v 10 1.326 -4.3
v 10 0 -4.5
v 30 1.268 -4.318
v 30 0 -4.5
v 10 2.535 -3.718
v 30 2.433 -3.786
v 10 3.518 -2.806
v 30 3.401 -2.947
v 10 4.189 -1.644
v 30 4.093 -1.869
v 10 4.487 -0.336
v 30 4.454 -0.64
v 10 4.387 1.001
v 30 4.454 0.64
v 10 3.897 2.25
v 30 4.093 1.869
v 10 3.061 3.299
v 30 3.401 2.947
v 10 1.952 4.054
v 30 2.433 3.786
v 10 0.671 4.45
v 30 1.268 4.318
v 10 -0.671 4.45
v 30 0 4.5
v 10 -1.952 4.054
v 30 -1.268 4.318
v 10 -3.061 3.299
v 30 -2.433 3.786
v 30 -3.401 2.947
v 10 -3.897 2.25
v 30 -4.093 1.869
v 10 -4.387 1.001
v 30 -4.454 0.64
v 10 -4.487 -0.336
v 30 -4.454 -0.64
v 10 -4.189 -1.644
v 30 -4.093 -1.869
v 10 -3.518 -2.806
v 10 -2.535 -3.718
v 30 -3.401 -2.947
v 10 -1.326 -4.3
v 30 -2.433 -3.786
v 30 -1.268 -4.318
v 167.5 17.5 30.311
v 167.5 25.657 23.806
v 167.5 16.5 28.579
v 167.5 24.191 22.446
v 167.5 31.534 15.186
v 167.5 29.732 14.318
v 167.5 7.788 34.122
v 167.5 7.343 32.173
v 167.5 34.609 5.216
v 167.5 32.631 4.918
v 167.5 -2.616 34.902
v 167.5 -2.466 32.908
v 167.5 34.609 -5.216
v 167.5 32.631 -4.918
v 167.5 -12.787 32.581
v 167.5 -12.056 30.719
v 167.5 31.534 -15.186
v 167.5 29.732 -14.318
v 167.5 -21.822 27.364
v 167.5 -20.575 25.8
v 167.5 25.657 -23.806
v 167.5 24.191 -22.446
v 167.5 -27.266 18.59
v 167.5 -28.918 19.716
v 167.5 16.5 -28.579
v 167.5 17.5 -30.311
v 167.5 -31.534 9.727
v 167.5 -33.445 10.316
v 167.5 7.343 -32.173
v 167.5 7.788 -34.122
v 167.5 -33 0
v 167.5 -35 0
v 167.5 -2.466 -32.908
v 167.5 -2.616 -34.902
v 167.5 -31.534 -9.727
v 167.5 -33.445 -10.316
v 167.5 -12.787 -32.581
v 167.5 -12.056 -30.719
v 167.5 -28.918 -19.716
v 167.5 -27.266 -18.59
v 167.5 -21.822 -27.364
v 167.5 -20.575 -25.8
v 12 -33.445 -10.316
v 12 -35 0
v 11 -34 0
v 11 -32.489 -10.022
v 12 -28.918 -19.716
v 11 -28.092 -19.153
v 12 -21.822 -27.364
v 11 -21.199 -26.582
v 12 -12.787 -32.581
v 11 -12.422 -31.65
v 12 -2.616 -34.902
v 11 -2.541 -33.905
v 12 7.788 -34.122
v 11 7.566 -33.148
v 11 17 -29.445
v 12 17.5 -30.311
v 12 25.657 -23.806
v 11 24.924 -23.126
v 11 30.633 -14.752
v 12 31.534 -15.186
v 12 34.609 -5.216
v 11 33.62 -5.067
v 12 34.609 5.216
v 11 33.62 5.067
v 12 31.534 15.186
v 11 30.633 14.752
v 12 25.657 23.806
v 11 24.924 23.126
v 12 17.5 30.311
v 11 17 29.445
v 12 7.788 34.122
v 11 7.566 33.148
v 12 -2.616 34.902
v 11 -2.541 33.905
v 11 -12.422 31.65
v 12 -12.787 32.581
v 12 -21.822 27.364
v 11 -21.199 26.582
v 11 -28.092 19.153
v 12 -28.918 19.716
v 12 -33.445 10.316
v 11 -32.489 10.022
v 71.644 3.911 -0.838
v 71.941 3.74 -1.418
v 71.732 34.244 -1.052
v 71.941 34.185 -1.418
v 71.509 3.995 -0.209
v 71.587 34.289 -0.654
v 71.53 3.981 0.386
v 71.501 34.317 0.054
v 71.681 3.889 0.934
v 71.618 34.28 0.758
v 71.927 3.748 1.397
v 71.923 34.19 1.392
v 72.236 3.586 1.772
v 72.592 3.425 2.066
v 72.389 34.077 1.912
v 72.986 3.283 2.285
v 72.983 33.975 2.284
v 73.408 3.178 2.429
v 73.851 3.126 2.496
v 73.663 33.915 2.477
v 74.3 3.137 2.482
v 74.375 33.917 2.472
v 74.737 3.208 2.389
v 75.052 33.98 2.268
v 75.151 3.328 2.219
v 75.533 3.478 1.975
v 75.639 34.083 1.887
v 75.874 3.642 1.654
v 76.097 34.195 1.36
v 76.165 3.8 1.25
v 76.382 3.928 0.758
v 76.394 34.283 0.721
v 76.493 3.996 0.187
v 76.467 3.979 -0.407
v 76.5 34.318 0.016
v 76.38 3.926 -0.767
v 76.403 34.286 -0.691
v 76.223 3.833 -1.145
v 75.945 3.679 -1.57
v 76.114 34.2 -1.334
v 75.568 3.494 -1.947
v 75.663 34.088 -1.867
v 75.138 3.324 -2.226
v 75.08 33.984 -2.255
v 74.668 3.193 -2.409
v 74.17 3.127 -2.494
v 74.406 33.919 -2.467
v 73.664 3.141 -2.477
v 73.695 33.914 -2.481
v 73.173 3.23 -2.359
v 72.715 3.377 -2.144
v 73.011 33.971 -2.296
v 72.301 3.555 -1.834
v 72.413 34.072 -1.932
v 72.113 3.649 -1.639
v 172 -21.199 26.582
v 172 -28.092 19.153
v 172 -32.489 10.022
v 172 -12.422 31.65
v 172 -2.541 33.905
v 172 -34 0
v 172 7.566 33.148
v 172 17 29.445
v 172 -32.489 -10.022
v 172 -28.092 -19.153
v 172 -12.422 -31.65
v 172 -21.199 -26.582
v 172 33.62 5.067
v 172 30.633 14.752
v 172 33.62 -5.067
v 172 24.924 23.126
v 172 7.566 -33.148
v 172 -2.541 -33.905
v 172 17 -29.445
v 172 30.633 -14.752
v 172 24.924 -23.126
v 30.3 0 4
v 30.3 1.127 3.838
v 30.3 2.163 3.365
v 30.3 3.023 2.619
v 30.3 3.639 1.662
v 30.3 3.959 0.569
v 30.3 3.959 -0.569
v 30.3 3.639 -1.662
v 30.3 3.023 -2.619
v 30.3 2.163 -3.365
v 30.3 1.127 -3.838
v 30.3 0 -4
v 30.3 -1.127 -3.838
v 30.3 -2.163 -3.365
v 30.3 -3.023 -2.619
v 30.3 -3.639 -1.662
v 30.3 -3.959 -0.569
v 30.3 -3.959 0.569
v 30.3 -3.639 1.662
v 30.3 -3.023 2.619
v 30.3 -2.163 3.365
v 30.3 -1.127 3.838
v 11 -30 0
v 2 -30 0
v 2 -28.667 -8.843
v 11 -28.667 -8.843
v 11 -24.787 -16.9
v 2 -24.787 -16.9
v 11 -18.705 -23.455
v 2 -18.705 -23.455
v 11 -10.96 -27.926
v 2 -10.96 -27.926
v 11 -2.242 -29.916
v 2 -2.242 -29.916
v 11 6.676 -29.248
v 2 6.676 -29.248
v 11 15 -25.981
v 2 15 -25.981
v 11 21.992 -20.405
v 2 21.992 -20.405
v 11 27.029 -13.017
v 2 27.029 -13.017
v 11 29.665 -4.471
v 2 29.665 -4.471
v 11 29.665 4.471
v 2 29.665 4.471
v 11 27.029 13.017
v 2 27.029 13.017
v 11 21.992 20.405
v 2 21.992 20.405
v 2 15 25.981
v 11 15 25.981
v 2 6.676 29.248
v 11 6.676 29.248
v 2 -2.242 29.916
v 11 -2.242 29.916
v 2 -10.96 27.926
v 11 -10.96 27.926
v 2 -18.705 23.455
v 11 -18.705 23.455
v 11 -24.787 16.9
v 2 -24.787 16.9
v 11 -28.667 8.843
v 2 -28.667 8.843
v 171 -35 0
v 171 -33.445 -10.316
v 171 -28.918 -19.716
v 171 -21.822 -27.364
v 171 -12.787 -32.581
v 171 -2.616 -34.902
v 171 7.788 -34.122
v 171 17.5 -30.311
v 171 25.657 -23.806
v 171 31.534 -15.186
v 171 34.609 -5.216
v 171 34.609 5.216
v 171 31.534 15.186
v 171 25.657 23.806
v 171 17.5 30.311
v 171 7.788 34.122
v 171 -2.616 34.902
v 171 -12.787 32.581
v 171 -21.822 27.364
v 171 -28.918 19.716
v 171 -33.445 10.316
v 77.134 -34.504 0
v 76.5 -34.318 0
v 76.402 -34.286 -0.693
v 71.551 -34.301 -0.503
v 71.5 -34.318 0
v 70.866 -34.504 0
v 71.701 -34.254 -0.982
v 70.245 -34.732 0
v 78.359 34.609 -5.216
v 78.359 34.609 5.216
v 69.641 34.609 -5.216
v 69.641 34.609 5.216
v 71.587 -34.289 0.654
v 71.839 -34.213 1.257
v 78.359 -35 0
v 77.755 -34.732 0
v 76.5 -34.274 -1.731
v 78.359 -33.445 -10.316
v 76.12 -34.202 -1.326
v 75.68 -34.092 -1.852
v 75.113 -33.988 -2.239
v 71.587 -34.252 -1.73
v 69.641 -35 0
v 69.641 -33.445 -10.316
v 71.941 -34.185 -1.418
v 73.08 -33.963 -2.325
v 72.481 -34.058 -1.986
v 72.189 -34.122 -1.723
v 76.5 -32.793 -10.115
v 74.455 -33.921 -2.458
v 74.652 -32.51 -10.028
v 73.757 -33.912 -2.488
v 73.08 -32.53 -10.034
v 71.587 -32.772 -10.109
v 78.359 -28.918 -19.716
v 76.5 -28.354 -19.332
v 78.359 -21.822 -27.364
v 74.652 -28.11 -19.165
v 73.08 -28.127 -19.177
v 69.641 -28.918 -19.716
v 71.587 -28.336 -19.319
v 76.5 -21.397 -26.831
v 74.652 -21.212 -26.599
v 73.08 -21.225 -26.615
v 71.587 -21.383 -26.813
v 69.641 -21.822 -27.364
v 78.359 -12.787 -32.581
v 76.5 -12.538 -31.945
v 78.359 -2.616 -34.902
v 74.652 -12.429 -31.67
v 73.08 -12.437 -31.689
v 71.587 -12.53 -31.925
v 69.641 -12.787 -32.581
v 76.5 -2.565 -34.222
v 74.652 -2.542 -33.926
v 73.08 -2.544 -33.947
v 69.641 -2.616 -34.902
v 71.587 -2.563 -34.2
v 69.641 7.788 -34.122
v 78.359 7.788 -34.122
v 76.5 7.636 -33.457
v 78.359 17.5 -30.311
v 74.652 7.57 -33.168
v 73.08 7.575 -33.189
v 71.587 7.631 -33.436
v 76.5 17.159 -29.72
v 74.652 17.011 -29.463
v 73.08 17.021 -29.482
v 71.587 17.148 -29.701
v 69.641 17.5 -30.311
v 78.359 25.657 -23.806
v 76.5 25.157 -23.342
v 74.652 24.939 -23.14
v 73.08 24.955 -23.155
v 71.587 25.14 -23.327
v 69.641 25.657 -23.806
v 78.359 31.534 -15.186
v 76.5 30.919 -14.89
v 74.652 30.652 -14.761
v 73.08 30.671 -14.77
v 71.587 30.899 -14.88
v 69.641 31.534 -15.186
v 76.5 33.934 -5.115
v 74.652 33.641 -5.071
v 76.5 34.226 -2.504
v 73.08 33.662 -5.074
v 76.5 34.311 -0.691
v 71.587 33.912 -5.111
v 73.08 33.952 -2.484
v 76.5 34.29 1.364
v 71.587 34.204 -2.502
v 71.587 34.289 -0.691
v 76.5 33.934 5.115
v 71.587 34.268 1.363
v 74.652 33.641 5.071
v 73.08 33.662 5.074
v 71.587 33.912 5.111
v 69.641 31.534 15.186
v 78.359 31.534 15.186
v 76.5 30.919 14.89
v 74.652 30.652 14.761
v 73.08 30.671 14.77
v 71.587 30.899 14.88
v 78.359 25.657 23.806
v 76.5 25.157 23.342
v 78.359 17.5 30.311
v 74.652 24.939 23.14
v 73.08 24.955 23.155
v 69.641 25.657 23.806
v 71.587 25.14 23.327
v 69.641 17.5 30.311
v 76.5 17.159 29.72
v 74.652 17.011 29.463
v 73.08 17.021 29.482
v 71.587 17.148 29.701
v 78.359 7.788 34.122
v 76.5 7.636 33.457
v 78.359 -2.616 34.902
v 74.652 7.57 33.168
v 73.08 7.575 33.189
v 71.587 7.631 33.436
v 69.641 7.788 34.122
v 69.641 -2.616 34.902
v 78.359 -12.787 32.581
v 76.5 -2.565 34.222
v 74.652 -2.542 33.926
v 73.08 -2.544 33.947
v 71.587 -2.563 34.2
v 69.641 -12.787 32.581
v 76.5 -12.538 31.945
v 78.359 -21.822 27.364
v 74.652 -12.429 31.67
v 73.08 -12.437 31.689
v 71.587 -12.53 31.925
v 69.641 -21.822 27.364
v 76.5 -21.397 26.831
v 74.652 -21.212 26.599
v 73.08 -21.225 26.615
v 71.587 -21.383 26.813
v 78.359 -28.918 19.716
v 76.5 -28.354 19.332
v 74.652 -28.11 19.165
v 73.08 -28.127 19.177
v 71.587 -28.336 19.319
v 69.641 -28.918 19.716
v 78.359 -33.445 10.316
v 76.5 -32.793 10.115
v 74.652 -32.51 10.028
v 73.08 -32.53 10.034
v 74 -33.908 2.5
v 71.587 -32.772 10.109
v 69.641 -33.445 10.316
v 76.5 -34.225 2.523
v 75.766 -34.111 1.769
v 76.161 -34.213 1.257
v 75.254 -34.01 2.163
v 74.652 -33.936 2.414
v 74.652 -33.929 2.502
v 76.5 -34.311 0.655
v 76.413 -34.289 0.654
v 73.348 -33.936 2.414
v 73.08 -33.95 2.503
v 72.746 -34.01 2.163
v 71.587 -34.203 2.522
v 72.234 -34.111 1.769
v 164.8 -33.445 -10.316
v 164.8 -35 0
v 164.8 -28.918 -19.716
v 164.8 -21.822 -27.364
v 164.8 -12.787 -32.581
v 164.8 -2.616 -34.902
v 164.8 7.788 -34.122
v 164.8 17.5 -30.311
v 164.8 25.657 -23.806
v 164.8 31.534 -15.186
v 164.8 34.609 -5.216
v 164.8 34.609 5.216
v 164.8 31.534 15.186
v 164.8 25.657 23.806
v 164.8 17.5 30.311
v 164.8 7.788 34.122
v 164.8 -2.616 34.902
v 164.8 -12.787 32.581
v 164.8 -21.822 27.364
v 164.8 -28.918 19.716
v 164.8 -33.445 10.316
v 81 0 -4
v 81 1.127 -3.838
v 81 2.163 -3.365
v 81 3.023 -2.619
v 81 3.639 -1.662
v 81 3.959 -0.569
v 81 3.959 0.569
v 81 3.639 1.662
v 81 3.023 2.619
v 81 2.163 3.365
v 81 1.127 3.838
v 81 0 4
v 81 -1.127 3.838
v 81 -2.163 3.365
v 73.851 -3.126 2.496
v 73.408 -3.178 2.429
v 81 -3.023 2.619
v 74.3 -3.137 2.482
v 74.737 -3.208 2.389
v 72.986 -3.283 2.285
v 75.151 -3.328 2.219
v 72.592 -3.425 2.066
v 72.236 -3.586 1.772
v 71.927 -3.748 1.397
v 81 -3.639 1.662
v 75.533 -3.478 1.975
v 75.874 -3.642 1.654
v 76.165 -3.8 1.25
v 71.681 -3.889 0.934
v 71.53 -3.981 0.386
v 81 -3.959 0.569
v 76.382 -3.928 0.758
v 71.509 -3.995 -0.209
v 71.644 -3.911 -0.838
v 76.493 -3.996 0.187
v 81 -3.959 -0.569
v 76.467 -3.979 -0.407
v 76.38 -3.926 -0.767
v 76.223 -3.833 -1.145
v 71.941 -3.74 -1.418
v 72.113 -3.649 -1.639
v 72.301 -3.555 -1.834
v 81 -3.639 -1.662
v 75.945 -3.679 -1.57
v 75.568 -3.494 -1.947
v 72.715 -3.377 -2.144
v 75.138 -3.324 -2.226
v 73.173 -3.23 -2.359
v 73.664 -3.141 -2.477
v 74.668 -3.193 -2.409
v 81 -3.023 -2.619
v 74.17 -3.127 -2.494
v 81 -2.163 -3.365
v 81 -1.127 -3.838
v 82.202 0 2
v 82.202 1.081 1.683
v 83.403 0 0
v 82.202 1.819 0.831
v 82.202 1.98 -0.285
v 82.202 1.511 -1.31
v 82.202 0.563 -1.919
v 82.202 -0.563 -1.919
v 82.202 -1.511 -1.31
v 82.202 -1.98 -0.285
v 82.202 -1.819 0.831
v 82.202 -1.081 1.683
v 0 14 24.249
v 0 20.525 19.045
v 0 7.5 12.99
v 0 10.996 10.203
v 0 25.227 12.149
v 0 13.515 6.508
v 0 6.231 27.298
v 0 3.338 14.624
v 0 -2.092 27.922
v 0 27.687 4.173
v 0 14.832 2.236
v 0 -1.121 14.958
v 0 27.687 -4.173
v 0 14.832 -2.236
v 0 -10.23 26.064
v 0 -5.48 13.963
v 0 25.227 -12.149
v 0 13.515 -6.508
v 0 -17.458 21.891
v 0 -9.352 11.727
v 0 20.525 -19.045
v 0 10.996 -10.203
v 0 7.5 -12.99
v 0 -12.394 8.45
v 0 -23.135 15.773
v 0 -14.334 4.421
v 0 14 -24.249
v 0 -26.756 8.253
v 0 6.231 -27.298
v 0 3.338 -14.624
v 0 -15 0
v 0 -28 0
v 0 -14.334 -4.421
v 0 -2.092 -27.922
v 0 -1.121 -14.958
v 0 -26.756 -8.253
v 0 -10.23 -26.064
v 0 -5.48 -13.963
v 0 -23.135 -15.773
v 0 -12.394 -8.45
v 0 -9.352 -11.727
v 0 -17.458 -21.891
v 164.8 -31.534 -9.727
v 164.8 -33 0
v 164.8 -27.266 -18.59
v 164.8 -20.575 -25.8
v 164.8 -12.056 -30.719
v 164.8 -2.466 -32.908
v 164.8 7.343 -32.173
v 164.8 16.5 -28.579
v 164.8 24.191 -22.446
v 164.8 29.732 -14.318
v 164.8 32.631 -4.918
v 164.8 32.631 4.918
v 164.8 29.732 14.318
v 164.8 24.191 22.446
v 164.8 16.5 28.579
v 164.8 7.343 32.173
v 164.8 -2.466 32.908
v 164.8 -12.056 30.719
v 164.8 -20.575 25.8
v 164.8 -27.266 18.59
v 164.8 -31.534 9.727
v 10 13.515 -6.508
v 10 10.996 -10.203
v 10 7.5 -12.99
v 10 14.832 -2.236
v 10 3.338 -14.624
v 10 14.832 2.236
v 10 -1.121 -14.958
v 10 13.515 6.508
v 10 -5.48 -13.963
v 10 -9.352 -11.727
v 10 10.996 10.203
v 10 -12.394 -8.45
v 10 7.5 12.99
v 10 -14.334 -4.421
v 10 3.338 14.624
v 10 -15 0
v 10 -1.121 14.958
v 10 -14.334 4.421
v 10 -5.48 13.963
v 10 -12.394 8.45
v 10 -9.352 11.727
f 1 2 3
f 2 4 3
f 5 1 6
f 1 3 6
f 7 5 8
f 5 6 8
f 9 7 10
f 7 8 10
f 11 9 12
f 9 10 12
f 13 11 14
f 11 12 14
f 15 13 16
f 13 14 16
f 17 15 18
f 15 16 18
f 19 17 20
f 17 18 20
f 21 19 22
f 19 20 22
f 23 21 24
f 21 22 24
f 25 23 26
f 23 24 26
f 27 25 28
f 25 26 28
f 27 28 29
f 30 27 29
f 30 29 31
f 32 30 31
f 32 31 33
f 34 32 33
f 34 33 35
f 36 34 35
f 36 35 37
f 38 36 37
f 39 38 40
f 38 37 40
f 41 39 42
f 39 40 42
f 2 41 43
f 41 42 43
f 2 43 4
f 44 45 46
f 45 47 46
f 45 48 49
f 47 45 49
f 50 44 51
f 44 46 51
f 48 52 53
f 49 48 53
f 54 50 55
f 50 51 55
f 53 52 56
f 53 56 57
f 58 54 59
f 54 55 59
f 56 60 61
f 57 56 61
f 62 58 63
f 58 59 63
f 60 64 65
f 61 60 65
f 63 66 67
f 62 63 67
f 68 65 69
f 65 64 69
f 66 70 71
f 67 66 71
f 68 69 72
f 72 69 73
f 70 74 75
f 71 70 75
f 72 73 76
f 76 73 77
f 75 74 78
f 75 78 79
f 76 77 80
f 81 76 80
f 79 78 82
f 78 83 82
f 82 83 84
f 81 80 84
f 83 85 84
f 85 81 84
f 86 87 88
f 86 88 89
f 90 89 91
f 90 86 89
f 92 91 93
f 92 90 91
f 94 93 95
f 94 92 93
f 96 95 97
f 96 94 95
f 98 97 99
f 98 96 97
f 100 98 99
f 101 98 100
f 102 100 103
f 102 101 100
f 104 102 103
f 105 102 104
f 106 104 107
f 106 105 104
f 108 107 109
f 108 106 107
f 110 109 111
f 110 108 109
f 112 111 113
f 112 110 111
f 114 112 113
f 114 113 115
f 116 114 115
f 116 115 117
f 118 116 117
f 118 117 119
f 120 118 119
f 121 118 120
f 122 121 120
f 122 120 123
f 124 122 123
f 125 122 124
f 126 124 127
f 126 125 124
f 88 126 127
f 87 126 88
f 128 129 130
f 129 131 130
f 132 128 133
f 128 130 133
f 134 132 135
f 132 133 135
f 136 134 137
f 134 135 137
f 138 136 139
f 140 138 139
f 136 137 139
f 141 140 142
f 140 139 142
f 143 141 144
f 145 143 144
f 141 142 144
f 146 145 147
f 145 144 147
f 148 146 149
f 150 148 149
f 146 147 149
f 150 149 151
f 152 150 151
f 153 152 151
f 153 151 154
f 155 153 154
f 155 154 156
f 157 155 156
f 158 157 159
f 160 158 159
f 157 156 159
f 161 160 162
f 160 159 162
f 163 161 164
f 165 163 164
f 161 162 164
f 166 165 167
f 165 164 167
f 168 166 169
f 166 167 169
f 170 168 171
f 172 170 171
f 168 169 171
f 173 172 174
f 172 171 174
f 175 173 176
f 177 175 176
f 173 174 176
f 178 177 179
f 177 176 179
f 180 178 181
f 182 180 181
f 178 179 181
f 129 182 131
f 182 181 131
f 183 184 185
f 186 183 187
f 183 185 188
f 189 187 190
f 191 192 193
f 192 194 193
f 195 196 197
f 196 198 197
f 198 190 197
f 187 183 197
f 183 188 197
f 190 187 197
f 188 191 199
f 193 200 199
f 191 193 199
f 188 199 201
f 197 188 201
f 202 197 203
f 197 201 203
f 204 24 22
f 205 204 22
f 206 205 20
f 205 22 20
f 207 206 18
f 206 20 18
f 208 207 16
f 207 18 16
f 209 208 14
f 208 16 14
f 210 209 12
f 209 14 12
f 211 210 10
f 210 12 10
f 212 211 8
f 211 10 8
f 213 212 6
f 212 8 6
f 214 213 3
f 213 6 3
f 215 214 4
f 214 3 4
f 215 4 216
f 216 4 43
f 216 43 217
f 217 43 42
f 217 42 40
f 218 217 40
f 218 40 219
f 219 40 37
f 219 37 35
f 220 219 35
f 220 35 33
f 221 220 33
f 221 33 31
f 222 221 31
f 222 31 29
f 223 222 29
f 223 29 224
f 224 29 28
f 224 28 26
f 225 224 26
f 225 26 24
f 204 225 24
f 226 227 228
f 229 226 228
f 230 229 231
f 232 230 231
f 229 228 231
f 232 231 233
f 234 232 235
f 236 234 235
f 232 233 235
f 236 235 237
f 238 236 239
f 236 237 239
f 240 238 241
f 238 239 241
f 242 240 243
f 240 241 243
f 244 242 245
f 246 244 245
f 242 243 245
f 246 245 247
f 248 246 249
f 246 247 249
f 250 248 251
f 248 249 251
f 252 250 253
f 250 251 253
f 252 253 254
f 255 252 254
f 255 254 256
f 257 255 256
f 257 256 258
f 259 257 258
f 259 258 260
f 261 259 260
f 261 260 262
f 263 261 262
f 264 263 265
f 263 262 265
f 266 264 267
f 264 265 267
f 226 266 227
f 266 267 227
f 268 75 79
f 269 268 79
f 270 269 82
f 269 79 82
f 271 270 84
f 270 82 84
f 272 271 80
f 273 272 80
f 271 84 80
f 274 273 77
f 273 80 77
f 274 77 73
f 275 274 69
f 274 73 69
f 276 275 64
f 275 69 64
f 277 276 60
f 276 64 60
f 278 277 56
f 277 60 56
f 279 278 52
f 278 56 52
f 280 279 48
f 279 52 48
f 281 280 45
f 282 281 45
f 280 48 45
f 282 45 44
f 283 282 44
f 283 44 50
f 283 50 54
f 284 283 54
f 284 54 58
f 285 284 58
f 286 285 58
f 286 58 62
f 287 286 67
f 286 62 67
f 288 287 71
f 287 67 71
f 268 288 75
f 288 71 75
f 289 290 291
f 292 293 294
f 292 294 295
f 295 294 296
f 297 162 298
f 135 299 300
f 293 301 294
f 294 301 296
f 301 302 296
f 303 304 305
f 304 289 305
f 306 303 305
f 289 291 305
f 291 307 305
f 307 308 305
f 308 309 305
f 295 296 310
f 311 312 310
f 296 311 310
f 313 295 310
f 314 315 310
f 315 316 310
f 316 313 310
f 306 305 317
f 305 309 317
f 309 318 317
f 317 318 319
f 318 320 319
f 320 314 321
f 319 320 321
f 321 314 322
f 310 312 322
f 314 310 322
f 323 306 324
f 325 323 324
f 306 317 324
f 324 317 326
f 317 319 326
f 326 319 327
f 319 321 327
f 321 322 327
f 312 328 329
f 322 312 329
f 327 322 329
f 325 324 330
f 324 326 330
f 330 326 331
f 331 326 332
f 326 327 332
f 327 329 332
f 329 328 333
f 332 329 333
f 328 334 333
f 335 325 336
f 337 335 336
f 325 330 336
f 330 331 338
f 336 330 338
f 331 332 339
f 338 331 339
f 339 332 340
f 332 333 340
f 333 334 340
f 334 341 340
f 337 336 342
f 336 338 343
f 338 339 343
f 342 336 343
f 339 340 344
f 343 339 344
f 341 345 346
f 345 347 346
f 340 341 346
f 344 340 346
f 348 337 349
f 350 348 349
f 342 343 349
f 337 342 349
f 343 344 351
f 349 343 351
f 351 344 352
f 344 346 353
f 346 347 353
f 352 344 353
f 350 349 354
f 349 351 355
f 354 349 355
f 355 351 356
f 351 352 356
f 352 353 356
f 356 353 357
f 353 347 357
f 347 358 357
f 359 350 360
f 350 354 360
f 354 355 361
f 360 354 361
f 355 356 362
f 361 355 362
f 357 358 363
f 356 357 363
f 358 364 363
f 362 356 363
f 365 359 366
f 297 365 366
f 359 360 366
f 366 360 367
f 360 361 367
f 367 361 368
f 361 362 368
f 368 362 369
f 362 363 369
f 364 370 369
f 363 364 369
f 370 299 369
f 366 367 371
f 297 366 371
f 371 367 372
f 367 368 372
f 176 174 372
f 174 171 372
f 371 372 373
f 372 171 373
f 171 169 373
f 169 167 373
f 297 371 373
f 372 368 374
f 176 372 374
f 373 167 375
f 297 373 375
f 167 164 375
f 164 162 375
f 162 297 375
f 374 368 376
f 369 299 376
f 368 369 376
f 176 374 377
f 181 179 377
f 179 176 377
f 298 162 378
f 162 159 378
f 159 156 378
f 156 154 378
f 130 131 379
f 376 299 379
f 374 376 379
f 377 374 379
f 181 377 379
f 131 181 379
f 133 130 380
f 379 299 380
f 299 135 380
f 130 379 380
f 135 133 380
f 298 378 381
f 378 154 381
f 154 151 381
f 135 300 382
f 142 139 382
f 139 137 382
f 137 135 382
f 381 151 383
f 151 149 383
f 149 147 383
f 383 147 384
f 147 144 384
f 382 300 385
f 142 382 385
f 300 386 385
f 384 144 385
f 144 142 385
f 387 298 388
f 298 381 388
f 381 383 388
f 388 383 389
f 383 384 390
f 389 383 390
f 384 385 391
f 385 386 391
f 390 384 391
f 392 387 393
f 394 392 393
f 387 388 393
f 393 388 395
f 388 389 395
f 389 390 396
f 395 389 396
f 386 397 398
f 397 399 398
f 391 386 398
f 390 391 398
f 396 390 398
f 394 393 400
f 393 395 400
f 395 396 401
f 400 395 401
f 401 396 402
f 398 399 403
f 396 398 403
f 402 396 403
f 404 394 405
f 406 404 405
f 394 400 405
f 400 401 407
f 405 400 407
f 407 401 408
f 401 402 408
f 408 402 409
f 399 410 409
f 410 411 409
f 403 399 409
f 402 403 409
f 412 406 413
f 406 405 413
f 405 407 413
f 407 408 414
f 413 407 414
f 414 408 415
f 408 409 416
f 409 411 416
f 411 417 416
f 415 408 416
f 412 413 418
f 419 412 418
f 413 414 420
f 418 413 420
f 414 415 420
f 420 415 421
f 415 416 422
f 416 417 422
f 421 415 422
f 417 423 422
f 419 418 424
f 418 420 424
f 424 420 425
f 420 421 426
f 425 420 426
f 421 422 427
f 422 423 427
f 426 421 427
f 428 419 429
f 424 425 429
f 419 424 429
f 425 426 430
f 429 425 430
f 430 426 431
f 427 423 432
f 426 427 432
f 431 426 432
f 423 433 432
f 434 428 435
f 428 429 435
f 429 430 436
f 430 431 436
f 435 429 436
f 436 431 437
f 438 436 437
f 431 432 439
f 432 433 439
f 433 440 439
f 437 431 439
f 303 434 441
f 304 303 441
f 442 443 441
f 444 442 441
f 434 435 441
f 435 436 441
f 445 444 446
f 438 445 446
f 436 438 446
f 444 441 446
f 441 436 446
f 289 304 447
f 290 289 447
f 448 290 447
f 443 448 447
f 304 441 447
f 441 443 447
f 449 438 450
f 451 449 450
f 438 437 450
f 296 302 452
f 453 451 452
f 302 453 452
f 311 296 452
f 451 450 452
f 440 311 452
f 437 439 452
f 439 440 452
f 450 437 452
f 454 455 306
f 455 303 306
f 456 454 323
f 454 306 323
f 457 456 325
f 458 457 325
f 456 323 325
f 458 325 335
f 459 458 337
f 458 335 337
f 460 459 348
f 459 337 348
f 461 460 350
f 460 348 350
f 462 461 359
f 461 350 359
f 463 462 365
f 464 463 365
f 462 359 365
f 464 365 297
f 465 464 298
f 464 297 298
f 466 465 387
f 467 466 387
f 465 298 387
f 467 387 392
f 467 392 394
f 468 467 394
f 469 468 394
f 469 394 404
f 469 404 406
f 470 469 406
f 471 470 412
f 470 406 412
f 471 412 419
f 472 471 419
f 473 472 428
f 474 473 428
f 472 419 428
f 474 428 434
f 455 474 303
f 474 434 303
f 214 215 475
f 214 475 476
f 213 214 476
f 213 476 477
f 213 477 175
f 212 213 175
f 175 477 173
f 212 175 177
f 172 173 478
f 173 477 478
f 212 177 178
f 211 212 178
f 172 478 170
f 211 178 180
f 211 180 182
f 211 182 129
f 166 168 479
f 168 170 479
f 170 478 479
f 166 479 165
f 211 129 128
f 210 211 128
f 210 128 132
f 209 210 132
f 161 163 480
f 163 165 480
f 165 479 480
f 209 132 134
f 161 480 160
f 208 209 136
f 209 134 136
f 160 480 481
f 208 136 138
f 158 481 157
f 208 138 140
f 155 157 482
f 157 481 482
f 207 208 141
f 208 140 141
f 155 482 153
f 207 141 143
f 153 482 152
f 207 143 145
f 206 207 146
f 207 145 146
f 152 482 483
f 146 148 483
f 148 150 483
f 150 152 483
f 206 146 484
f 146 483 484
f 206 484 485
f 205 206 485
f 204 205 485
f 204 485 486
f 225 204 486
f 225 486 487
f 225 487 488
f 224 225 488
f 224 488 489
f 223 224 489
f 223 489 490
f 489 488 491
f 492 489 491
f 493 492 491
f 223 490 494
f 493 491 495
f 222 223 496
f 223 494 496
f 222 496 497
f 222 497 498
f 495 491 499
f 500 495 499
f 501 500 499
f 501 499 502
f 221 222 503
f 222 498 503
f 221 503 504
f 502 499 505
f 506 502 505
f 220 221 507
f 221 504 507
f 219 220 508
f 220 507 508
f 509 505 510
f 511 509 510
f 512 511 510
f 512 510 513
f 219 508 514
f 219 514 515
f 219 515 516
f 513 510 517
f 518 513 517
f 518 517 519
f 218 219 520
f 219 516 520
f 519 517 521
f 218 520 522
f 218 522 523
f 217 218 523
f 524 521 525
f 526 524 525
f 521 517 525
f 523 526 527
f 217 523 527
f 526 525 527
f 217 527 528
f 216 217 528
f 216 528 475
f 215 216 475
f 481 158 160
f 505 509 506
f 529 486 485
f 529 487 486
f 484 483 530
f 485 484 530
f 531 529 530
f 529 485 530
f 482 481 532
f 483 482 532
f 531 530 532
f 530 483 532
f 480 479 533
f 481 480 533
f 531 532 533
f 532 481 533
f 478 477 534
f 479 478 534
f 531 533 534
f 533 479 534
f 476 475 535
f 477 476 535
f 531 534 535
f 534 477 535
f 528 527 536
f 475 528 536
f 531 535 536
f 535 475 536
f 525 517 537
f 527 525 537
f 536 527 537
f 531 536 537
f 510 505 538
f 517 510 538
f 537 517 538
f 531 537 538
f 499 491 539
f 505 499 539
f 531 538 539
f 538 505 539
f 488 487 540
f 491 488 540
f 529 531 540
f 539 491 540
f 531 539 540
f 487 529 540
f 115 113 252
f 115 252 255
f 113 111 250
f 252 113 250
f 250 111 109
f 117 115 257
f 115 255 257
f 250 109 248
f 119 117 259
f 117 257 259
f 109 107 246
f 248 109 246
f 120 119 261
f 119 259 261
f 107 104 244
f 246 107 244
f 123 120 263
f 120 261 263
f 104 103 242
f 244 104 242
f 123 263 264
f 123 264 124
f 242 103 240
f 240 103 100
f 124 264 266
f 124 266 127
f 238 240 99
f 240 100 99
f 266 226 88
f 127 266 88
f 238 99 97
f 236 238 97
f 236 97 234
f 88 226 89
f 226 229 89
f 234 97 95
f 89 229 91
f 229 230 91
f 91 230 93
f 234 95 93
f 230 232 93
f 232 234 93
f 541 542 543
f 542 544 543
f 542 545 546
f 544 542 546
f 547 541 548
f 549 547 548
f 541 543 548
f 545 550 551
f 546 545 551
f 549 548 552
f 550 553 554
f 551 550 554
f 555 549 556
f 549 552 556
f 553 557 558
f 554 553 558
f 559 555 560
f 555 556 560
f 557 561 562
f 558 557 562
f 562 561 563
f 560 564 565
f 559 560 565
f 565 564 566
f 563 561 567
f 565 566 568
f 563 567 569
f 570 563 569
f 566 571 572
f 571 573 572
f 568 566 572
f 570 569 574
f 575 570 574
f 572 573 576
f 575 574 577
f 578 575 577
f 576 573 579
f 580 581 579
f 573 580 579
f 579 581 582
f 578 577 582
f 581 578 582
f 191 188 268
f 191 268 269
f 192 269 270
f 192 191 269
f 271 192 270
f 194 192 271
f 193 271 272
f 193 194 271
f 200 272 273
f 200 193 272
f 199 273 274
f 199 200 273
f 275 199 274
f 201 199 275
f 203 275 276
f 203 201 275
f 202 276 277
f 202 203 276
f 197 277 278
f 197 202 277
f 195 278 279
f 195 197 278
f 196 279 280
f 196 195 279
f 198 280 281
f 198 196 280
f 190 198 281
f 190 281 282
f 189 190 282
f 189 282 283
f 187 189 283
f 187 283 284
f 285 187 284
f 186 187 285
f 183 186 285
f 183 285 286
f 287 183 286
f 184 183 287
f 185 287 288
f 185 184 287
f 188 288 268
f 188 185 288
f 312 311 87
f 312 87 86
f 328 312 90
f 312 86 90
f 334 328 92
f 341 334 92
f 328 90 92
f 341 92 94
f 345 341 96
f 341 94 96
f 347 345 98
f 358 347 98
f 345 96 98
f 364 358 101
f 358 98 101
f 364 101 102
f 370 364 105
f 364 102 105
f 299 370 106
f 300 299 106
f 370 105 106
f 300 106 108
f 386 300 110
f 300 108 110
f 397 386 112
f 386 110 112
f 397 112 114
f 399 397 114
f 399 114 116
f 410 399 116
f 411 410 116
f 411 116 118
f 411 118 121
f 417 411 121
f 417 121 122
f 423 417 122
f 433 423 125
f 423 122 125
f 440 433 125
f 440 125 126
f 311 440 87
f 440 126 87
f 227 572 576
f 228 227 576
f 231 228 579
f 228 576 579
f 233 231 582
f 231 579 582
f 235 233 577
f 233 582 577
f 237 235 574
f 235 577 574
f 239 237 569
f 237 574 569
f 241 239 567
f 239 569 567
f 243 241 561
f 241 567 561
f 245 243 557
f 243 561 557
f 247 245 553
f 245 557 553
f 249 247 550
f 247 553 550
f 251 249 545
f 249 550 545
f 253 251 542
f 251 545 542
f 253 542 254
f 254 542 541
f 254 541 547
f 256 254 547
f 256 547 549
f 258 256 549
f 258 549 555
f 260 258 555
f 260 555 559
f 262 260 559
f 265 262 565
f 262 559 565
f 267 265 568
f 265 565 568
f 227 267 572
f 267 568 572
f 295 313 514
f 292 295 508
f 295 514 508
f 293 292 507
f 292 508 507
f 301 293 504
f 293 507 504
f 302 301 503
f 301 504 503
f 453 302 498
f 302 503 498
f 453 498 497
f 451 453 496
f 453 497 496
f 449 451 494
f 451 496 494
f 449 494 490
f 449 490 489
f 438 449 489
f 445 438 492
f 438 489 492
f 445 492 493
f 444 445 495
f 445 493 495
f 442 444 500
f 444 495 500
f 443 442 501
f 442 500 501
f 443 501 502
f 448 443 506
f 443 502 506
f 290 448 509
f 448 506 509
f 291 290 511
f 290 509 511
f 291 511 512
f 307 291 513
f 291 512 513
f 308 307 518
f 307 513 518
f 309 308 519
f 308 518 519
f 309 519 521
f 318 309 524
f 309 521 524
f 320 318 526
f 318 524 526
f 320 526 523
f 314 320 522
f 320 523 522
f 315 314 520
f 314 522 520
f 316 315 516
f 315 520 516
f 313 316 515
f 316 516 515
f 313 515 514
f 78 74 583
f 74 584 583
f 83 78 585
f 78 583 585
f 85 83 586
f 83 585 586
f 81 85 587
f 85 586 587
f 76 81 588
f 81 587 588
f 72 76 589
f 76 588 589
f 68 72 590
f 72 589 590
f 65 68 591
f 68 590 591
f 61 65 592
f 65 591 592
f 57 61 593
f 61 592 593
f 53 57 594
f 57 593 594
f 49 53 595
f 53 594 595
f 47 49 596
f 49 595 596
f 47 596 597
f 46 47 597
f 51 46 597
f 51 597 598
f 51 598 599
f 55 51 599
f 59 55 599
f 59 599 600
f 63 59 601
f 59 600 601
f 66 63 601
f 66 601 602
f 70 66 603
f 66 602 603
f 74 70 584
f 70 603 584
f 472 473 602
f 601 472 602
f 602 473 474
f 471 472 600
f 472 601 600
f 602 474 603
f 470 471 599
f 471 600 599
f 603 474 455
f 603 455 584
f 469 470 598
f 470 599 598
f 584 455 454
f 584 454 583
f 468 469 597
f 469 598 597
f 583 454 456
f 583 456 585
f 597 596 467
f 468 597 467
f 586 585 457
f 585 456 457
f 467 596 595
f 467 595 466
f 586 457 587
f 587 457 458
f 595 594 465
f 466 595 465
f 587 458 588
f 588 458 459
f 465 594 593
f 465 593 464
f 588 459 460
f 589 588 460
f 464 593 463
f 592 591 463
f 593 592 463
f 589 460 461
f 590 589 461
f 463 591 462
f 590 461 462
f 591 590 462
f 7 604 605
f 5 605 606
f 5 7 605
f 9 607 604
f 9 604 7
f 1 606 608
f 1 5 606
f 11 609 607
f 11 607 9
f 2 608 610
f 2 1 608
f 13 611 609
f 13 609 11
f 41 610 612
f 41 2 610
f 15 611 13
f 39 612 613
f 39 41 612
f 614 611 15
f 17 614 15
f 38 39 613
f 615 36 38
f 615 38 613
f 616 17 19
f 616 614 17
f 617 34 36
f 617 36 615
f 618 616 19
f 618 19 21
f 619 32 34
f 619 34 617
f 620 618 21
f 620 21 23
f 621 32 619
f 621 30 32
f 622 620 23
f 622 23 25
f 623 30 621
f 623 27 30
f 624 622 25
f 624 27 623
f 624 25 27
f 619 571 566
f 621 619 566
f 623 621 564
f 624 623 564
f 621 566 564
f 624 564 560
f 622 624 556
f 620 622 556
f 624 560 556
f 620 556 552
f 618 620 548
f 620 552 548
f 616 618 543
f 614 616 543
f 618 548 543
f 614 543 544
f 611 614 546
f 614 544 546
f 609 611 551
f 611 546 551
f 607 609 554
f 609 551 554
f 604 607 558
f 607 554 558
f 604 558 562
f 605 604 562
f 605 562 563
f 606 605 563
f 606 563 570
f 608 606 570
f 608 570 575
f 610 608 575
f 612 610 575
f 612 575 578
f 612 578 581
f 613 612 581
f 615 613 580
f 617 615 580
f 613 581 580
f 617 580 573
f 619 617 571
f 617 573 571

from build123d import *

# Parameters (mm, degrees)
SKETCH_2_R                = 2.5
CUT_EXTRUDE_1_DEPTH       = 50
CHAMFER_1_SIZE            = 2
CHAMFER_2_SIZE            = 1
CHAMFER_3_SIZE            = 1
SKETCH_3_R                = 15
CUT_EXTRUDE_2_DEPTH       = 10
HOLE_WIZARD_8_0_8_2_D     = 8
HOLE_WIZARD_8_0_8_2_DEPTH = 71
HOLE_WIZARD_8_0_8_2_TIP   = 2.403442476
M10X1_0_2_D               = 9
M10X1_0_2_DEPTH           = 20
M10X1_0_2_TIP             = 2.703872786


with BuildPart() as part:
    # 草图1 → 旋转1 (revolve)
    with BuildSketch(Plane.XY, mode=Mode.PRIVATE) as revolve_1_sk:
        with BuildLine():
            Line((0, 0), (172, 0))
            Line((172, 0), (172, 35))
            Line((172, 35), (167.5, 35))
            Line((167.5, 35), (167.5, 33))
            Line((167.5, 33), (164.8, 33))
            Line((164.8, 33), (164.8, 35))
            Line((164.8, 35), (78.358898944, 35))
            ThreePointArc((78.358898944, 35), (74, 34), (69.641101056, 35))
            Line((69.641101056, 35), (11, 35))
            Line((11, 35), (11, 30))
            Line((11, 30), (0, 30))
            Line((0, 30), (0, 0))
        make_face()
    revolve(revolve_1_sk.sketch.rotate(Axis((0, 0, 0), (1, 0, 0)), 180), axis=Axis((0, 0, 0), (1, 0, 0)))

    # 草图2 → 切除-拉伸1 (cut, symmetric)
    with BuildSketch(Plane(origin=(0, 0, 0), x_dir=(1, 0, 0), z_dir=(0, 1, 0))):
        with Locations(Location((74, 0, 0), (0, 0, 145.453943399))):
            Circle(SKETCH_2_R)
    extrude(amount=CUT_EXTRUDE_1_DEPTH, both=True, mode=Mode.SUBTRACT)

    # 倒角1
    chamfer_1_edges = [part.edges().sort_by_distance(p)[0] for p in [
        (0, 30, 0),
    ]]
    chamfer(chamfer_1_edges, length=CHAMFER_1_SIZE)

    # 倒角2
    chamfer_2_edges = [part.edges().sort_by_distance(p)[0] for p in [
        (11, 35, 0),
    ]]
    chamfer(chamfer_2_edges, length=CHAMFER_2_SIZE)

    # 倒角3
    chamfer_3_edges = [part.edges().sort_by_distance(p)[0] for p in [
        (172, 35, 0),
    ]]
    chamfer(chamfer_3_edges, length=CHAMFER_3_SIZE)

    # 草图3 → 切除-拉伸2 (cut)
    with BuildSketch(Plane.ZY):
        with Locations(Location((0, 0, 0), (0, 0, 270))):
            Circle(SKETCH_3_R)
    extrude(amount=-CUT_EXTRUDE_2_DEPTH, mode=Mode.SUBTRACT)

    # Ø8.0 (8) 直径孔2
    with Locations(Plane.ZY.offset(-10)):
        with Locations((0, 0)):
            Hole(HOLE_WIZARD_8_0_8_2_D / 2, depth=HOLE_WIZARD_8_0_8_2_DEPTH)
            with Locations((0, 0, -(HOLE_WIZARD_8_0_8_2_DEPTH + HOLE_WIZARD_8_0_8_2_TIP / 2))):  # 118° drill point
                Cone(0, HOLE_WIZARD_8_0_8_2_D / 2, HOLE_WIZARD_8_0_8_2_TIP, mode=Mode.SUBTRACT)

    # M10x1.0 螺纹孔2
    with Locations(Plane.ZY.offset(-10)):
        with Locations((0, 0)):
            Hole(M10X1_0_2_D / 2, depth=M10X1_0_2_DEPTH)
            with Locations((0, 0, -(M10X1_0_2_DEPTH + M10X1_0_2_TIP / 2))):  # 118° drill point
                Cone(0, M10X1_0_2_D / 2, M10X1_0_2_TIP, mode=Mode.SUBTRACT)


solid = part.part
